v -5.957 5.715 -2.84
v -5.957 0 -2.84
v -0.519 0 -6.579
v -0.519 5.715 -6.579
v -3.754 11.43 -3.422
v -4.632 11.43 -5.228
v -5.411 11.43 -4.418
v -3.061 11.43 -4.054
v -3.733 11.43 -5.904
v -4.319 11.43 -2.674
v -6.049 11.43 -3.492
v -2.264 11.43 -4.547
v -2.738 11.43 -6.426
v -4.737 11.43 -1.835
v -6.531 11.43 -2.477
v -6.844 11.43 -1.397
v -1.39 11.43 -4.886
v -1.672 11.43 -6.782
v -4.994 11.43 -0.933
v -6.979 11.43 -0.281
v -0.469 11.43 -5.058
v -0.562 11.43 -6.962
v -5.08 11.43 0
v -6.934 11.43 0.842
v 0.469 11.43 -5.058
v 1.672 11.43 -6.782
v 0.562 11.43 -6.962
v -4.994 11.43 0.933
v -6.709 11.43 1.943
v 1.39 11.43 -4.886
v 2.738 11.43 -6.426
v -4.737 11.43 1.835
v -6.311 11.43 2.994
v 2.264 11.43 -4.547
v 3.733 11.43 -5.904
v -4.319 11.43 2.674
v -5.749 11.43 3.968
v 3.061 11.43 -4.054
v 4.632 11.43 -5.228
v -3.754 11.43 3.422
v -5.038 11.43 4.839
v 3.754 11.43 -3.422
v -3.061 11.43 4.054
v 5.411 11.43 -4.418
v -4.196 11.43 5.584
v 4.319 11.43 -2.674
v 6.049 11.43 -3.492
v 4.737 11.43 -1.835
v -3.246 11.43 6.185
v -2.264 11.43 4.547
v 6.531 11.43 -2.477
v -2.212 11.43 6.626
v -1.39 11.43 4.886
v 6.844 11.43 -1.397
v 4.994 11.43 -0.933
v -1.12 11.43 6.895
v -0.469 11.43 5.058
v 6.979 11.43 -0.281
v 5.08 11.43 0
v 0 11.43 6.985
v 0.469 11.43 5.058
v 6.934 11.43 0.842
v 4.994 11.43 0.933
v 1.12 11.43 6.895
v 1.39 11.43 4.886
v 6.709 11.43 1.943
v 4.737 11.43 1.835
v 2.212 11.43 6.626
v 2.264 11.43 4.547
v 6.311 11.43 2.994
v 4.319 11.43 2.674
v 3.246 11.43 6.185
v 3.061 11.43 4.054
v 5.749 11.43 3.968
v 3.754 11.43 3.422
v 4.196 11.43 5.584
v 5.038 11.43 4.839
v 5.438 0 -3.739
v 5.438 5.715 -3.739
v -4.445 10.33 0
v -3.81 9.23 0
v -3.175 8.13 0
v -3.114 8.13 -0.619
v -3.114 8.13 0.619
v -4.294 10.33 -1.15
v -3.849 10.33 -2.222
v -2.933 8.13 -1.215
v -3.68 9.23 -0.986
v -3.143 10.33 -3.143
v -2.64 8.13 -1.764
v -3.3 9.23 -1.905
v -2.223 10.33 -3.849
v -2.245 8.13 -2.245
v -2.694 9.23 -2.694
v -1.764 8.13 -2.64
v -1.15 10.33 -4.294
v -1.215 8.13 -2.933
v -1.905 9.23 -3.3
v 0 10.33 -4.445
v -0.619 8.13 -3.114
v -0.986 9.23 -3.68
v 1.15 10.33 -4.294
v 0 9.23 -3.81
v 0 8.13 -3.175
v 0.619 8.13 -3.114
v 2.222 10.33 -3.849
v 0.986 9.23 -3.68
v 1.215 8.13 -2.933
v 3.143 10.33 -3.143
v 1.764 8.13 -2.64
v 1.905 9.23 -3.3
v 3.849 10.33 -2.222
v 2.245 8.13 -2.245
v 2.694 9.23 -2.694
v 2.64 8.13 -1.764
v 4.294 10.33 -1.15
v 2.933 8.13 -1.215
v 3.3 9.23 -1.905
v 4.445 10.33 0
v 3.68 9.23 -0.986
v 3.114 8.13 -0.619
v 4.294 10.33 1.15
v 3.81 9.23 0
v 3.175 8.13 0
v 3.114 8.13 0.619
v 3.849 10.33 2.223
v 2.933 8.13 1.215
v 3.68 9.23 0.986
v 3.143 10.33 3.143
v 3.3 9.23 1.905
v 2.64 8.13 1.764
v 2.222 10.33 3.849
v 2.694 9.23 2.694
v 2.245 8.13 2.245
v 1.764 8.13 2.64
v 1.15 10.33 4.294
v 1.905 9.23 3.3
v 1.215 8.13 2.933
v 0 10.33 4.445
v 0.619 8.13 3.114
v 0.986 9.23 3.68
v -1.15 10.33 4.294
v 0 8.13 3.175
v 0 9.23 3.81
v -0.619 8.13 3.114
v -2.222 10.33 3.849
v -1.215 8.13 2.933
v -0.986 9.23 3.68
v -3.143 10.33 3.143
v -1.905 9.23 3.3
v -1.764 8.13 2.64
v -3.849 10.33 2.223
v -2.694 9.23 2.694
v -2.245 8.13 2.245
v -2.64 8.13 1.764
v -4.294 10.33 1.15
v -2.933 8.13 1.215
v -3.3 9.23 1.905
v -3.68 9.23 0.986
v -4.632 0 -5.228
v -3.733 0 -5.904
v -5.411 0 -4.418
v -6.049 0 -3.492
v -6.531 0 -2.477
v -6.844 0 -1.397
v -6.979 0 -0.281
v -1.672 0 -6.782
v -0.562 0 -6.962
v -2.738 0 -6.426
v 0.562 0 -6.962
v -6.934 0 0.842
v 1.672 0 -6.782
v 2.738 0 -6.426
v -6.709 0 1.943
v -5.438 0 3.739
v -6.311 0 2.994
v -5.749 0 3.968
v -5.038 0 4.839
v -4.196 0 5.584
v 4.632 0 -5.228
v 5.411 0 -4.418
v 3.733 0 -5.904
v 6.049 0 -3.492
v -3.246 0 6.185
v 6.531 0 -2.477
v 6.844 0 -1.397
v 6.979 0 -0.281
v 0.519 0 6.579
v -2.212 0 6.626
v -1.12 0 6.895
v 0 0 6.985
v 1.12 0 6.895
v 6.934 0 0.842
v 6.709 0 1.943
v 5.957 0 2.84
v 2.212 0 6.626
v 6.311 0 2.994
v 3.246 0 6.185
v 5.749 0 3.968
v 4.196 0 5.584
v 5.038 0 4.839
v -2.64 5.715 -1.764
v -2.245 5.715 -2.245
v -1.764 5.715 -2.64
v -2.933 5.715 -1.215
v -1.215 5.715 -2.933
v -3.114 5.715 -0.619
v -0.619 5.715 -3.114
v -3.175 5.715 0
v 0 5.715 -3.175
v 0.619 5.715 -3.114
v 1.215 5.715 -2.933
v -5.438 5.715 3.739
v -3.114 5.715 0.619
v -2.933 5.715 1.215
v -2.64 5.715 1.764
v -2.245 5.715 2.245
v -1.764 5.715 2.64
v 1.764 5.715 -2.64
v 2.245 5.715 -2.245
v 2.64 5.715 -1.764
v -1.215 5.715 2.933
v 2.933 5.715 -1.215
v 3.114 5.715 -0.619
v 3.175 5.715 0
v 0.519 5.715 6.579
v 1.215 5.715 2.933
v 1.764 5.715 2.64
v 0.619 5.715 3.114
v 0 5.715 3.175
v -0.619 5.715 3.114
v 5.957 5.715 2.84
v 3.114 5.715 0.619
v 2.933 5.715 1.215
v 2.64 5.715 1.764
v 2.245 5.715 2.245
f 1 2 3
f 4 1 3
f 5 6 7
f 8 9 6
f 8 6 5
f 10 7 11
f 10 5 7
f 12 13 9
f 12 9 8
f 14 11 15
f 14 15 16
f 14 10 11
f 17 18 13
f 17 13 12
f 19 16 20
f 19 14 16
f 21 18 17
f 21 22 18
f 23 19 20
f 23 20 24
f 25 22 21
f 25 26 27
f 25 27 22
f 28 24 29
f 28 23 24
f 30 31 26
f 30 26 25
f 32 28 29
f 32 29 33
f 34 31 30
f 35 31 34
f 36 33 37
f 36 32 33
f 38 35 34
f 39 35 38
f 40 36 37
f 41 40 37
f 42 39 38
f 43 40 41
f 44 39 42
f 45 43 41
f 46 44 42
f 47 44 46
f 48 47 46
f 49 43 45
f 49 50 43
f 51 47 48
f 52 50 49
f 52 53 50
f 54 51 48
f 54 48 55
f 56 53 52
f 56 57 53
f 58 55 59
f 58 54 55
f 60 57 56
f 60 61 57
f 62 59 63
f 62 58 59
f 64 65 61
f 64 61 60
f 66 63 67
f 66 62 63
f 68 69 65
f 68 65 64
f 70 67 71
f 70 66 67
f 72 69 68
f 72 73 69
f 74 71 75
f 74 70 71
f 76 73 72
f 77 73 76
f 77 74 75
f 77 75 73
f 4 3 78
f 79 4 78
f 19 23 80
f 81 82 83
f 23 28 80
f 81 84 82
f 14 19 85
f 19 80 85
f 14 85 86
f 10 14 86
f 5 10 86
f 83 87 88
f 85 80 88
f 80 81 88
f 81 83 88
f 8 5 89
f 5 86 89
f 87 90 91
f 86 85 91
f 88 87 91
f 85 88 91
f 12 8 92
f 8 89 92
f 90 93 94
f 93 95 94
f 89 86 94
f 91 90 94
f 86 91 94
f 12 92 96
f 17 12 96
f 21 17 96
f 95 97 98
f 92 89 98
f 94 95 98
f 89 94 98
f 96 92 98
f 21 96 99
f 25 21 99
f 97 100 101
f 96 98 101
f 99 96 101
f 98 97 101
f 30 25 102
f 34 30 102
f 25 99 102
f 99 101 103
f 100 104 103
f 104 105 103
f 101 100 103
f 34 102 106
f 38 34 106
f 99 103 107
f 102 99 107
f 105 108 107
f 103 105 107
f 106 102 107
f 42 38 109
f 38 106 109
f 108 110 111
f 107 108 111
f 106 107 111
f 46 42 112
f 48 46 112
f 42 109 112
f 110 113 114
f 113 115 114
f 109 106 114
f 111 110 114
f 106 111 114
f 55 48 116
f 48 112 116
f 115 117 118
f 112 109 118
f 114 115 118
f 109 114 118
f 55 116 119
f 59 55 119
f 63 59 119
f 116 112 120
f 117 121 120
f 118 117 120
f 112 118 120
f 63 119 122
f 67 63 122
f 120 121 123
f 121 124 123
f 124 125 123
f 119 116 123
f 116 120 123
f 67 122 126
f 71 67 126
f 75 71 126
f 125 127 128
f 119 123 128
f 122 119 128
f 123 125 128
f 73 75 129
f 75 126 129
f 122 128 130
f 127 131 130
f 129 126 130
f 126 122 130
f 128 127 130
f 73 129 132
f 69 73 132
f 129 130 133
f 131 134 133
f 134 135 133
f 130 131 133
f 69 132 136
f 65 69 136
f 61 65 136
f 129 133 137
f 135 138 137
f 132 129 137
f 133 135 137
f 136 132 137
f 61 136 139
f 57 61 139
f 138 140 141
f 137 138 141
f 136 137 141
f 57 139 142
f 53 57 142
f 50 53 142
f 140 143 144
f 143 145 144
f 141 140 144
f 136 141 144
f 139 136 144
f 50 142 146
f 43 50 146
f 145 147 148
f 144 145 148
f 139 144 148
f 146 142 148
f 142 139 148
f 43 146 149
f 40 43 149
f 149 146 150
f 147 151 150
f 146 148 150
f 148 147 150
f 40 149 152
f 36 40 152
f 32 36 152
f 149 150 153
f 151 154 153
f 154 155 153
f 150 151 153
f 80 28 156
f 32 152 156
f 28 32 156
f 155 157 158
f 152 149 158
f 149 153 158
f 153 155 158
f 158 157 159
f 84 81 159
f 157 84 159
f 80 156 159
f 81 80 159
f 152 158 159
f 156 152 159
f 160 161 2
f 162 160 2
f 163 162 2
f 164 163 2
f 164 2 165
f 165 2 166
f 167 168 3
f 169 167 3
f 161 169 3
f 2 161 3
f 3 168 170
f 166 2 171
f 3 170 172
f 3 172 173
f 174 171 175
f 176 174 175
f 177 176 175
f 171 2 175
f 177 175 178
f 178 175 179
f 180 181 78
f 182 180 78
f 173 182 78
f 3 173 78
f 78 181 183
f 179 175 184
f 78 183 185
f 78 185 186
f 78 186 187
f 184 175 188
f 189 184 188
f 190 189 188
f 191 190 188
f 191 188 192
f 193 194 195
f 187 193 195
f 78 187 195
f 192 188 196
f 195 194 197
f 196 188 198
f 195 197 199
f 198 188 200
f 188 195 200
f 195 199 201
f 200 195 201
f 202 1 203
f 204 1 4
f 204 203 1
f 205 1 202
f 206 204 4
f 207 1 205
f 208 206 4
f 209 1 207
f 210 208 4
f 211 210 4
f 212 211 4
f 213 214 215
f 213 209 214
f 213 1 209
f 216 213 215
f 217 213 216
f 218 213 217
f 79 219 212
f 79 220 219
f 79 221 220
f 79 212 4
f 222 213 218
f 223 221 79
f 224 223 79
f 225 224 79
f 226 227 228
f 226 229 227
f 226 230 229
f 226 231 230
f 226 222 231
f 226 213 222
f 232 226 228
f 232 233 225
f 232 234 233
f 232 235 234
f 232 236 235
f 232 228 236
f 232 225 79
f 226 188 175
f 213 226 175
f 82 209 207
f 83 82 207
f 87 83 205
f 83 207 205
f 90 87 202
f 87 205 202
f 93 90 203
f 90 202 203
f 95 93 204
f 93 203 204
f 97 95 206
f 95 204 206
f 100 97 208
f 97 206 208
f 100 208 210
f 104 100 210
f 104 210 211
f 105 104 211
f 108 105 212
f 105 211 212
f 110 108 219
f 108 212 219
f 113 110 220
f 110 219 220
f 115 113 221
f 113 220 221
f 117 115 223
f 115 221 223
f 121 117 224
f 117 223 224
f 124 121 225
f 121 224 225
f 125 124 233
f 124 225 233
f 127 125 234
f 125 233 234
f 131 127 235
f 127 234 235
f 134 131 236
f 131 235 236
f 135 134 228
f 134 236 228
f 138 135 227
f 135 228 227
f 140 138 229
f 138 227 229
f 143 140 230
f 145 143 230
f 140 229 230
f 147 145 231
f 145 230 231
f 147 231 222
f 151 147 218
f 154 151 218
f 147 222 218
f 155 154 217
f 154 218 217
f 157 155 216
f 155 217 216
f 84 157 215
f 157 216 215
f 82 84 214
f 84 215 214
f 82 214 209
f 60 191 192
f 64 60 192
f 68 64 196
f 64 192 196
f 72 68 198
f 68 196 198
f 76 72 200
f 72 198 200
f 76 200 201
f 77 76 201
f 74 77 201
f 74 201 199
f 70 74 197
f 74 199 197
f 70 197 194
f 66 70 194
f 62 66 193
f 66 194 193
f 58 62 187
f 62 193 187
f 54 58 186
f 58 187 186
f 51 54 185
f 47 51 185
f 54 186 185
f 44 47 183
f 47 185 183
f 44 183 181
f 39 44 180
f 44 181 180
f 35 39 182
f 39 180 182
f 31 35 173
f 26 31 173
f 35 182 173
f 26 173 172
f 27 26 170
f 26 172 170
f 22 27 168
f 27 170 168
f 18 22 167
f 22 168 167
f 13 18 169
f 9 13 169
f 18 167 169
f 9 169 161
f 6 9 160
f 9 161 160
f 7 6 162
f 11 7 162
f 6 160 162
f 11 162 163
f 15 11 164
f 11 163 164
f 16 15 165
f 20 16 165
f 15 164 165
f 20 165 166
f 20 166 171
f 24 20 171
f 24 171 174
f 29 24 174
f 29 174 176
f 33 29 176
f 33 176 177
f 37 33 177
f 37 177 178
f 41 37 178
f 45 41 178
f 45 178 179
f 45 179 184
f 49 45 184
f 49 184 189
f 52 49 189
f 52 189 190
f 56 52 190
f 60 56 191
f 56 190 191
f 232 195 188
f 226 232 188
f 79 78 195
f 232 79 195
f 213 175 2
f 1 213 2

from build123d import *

# Parameters (mm, degrees)
SKETCH1_R                                           = 6.985
BOSS_EXTRUDE1_DEPTH                                 = 11.43
CSK_FOR_1_4_FLAT_HEAD_MACHINE_SCREW_100_D           = 6.35
CSK_FOR_1_4_FLAT_HEAD_MACHINE_SCREW_100_CSINK_D     = 10.16
CSK_FOR_1_4_FLAT_HEAD_MACHINE_SCREW_100_CSINK_ANGLE = 60
CUT_EXTRUDE1_DEPTH                                  = 5.715


with BuildPart() as part:
    # Sketch1 → Boss-Extrude1 (new body)
    with BuildSketch(Plane(origin=(0, 0, 0), x_dir=(1, 0, 0), z_dir=(0, 1, 0))):
        with Locations(Location((0, 0, 0), (0, 0, 270))):
            Circle(SKETCH1_R)
    extrude(amount=BOSS_EXTRUDE1_DEPTH)

    # CSK for 1/4 Flat Head Machine Screw (100)1 (through all)
    with Locations(Plane(origin=(0, 11.43, 0), x_dir=(1, 0, 0), z_dir=(0, 1, 0))):
        with Locations((0, 0)):
            CounterSinkHole(CSK_FOR_1_4_FLAT_HEAD_MACHINE_SCREW_100_D / 2, CSK_FOR_1_4_FLAT_HEAD_MACHINE_SCREW_100_CSINK_D / 2, counter_sink_angle=CSK_FOR_1_4_FLAT_HEAD_MACHINE_SCREW_100_CSINK_ANGLE)

    # Sketch4 → Cut-Extrude1 (cut)
    with BuildSketch(Plane.XZ):
        Polygon((5.43794625, -3.738588047), (5.956685348, 2.840105573), (0.518739098, 6.57869362), (-5.43794625, 3.738588047), (-5.956685348, -2.840105573), (-0.518739098, -6.57869362), align=None)
    extrude(amount=-CUT_EXTRUDE1_DEPTH, mode=Mode.SUBTRACT)


solid = part.part
